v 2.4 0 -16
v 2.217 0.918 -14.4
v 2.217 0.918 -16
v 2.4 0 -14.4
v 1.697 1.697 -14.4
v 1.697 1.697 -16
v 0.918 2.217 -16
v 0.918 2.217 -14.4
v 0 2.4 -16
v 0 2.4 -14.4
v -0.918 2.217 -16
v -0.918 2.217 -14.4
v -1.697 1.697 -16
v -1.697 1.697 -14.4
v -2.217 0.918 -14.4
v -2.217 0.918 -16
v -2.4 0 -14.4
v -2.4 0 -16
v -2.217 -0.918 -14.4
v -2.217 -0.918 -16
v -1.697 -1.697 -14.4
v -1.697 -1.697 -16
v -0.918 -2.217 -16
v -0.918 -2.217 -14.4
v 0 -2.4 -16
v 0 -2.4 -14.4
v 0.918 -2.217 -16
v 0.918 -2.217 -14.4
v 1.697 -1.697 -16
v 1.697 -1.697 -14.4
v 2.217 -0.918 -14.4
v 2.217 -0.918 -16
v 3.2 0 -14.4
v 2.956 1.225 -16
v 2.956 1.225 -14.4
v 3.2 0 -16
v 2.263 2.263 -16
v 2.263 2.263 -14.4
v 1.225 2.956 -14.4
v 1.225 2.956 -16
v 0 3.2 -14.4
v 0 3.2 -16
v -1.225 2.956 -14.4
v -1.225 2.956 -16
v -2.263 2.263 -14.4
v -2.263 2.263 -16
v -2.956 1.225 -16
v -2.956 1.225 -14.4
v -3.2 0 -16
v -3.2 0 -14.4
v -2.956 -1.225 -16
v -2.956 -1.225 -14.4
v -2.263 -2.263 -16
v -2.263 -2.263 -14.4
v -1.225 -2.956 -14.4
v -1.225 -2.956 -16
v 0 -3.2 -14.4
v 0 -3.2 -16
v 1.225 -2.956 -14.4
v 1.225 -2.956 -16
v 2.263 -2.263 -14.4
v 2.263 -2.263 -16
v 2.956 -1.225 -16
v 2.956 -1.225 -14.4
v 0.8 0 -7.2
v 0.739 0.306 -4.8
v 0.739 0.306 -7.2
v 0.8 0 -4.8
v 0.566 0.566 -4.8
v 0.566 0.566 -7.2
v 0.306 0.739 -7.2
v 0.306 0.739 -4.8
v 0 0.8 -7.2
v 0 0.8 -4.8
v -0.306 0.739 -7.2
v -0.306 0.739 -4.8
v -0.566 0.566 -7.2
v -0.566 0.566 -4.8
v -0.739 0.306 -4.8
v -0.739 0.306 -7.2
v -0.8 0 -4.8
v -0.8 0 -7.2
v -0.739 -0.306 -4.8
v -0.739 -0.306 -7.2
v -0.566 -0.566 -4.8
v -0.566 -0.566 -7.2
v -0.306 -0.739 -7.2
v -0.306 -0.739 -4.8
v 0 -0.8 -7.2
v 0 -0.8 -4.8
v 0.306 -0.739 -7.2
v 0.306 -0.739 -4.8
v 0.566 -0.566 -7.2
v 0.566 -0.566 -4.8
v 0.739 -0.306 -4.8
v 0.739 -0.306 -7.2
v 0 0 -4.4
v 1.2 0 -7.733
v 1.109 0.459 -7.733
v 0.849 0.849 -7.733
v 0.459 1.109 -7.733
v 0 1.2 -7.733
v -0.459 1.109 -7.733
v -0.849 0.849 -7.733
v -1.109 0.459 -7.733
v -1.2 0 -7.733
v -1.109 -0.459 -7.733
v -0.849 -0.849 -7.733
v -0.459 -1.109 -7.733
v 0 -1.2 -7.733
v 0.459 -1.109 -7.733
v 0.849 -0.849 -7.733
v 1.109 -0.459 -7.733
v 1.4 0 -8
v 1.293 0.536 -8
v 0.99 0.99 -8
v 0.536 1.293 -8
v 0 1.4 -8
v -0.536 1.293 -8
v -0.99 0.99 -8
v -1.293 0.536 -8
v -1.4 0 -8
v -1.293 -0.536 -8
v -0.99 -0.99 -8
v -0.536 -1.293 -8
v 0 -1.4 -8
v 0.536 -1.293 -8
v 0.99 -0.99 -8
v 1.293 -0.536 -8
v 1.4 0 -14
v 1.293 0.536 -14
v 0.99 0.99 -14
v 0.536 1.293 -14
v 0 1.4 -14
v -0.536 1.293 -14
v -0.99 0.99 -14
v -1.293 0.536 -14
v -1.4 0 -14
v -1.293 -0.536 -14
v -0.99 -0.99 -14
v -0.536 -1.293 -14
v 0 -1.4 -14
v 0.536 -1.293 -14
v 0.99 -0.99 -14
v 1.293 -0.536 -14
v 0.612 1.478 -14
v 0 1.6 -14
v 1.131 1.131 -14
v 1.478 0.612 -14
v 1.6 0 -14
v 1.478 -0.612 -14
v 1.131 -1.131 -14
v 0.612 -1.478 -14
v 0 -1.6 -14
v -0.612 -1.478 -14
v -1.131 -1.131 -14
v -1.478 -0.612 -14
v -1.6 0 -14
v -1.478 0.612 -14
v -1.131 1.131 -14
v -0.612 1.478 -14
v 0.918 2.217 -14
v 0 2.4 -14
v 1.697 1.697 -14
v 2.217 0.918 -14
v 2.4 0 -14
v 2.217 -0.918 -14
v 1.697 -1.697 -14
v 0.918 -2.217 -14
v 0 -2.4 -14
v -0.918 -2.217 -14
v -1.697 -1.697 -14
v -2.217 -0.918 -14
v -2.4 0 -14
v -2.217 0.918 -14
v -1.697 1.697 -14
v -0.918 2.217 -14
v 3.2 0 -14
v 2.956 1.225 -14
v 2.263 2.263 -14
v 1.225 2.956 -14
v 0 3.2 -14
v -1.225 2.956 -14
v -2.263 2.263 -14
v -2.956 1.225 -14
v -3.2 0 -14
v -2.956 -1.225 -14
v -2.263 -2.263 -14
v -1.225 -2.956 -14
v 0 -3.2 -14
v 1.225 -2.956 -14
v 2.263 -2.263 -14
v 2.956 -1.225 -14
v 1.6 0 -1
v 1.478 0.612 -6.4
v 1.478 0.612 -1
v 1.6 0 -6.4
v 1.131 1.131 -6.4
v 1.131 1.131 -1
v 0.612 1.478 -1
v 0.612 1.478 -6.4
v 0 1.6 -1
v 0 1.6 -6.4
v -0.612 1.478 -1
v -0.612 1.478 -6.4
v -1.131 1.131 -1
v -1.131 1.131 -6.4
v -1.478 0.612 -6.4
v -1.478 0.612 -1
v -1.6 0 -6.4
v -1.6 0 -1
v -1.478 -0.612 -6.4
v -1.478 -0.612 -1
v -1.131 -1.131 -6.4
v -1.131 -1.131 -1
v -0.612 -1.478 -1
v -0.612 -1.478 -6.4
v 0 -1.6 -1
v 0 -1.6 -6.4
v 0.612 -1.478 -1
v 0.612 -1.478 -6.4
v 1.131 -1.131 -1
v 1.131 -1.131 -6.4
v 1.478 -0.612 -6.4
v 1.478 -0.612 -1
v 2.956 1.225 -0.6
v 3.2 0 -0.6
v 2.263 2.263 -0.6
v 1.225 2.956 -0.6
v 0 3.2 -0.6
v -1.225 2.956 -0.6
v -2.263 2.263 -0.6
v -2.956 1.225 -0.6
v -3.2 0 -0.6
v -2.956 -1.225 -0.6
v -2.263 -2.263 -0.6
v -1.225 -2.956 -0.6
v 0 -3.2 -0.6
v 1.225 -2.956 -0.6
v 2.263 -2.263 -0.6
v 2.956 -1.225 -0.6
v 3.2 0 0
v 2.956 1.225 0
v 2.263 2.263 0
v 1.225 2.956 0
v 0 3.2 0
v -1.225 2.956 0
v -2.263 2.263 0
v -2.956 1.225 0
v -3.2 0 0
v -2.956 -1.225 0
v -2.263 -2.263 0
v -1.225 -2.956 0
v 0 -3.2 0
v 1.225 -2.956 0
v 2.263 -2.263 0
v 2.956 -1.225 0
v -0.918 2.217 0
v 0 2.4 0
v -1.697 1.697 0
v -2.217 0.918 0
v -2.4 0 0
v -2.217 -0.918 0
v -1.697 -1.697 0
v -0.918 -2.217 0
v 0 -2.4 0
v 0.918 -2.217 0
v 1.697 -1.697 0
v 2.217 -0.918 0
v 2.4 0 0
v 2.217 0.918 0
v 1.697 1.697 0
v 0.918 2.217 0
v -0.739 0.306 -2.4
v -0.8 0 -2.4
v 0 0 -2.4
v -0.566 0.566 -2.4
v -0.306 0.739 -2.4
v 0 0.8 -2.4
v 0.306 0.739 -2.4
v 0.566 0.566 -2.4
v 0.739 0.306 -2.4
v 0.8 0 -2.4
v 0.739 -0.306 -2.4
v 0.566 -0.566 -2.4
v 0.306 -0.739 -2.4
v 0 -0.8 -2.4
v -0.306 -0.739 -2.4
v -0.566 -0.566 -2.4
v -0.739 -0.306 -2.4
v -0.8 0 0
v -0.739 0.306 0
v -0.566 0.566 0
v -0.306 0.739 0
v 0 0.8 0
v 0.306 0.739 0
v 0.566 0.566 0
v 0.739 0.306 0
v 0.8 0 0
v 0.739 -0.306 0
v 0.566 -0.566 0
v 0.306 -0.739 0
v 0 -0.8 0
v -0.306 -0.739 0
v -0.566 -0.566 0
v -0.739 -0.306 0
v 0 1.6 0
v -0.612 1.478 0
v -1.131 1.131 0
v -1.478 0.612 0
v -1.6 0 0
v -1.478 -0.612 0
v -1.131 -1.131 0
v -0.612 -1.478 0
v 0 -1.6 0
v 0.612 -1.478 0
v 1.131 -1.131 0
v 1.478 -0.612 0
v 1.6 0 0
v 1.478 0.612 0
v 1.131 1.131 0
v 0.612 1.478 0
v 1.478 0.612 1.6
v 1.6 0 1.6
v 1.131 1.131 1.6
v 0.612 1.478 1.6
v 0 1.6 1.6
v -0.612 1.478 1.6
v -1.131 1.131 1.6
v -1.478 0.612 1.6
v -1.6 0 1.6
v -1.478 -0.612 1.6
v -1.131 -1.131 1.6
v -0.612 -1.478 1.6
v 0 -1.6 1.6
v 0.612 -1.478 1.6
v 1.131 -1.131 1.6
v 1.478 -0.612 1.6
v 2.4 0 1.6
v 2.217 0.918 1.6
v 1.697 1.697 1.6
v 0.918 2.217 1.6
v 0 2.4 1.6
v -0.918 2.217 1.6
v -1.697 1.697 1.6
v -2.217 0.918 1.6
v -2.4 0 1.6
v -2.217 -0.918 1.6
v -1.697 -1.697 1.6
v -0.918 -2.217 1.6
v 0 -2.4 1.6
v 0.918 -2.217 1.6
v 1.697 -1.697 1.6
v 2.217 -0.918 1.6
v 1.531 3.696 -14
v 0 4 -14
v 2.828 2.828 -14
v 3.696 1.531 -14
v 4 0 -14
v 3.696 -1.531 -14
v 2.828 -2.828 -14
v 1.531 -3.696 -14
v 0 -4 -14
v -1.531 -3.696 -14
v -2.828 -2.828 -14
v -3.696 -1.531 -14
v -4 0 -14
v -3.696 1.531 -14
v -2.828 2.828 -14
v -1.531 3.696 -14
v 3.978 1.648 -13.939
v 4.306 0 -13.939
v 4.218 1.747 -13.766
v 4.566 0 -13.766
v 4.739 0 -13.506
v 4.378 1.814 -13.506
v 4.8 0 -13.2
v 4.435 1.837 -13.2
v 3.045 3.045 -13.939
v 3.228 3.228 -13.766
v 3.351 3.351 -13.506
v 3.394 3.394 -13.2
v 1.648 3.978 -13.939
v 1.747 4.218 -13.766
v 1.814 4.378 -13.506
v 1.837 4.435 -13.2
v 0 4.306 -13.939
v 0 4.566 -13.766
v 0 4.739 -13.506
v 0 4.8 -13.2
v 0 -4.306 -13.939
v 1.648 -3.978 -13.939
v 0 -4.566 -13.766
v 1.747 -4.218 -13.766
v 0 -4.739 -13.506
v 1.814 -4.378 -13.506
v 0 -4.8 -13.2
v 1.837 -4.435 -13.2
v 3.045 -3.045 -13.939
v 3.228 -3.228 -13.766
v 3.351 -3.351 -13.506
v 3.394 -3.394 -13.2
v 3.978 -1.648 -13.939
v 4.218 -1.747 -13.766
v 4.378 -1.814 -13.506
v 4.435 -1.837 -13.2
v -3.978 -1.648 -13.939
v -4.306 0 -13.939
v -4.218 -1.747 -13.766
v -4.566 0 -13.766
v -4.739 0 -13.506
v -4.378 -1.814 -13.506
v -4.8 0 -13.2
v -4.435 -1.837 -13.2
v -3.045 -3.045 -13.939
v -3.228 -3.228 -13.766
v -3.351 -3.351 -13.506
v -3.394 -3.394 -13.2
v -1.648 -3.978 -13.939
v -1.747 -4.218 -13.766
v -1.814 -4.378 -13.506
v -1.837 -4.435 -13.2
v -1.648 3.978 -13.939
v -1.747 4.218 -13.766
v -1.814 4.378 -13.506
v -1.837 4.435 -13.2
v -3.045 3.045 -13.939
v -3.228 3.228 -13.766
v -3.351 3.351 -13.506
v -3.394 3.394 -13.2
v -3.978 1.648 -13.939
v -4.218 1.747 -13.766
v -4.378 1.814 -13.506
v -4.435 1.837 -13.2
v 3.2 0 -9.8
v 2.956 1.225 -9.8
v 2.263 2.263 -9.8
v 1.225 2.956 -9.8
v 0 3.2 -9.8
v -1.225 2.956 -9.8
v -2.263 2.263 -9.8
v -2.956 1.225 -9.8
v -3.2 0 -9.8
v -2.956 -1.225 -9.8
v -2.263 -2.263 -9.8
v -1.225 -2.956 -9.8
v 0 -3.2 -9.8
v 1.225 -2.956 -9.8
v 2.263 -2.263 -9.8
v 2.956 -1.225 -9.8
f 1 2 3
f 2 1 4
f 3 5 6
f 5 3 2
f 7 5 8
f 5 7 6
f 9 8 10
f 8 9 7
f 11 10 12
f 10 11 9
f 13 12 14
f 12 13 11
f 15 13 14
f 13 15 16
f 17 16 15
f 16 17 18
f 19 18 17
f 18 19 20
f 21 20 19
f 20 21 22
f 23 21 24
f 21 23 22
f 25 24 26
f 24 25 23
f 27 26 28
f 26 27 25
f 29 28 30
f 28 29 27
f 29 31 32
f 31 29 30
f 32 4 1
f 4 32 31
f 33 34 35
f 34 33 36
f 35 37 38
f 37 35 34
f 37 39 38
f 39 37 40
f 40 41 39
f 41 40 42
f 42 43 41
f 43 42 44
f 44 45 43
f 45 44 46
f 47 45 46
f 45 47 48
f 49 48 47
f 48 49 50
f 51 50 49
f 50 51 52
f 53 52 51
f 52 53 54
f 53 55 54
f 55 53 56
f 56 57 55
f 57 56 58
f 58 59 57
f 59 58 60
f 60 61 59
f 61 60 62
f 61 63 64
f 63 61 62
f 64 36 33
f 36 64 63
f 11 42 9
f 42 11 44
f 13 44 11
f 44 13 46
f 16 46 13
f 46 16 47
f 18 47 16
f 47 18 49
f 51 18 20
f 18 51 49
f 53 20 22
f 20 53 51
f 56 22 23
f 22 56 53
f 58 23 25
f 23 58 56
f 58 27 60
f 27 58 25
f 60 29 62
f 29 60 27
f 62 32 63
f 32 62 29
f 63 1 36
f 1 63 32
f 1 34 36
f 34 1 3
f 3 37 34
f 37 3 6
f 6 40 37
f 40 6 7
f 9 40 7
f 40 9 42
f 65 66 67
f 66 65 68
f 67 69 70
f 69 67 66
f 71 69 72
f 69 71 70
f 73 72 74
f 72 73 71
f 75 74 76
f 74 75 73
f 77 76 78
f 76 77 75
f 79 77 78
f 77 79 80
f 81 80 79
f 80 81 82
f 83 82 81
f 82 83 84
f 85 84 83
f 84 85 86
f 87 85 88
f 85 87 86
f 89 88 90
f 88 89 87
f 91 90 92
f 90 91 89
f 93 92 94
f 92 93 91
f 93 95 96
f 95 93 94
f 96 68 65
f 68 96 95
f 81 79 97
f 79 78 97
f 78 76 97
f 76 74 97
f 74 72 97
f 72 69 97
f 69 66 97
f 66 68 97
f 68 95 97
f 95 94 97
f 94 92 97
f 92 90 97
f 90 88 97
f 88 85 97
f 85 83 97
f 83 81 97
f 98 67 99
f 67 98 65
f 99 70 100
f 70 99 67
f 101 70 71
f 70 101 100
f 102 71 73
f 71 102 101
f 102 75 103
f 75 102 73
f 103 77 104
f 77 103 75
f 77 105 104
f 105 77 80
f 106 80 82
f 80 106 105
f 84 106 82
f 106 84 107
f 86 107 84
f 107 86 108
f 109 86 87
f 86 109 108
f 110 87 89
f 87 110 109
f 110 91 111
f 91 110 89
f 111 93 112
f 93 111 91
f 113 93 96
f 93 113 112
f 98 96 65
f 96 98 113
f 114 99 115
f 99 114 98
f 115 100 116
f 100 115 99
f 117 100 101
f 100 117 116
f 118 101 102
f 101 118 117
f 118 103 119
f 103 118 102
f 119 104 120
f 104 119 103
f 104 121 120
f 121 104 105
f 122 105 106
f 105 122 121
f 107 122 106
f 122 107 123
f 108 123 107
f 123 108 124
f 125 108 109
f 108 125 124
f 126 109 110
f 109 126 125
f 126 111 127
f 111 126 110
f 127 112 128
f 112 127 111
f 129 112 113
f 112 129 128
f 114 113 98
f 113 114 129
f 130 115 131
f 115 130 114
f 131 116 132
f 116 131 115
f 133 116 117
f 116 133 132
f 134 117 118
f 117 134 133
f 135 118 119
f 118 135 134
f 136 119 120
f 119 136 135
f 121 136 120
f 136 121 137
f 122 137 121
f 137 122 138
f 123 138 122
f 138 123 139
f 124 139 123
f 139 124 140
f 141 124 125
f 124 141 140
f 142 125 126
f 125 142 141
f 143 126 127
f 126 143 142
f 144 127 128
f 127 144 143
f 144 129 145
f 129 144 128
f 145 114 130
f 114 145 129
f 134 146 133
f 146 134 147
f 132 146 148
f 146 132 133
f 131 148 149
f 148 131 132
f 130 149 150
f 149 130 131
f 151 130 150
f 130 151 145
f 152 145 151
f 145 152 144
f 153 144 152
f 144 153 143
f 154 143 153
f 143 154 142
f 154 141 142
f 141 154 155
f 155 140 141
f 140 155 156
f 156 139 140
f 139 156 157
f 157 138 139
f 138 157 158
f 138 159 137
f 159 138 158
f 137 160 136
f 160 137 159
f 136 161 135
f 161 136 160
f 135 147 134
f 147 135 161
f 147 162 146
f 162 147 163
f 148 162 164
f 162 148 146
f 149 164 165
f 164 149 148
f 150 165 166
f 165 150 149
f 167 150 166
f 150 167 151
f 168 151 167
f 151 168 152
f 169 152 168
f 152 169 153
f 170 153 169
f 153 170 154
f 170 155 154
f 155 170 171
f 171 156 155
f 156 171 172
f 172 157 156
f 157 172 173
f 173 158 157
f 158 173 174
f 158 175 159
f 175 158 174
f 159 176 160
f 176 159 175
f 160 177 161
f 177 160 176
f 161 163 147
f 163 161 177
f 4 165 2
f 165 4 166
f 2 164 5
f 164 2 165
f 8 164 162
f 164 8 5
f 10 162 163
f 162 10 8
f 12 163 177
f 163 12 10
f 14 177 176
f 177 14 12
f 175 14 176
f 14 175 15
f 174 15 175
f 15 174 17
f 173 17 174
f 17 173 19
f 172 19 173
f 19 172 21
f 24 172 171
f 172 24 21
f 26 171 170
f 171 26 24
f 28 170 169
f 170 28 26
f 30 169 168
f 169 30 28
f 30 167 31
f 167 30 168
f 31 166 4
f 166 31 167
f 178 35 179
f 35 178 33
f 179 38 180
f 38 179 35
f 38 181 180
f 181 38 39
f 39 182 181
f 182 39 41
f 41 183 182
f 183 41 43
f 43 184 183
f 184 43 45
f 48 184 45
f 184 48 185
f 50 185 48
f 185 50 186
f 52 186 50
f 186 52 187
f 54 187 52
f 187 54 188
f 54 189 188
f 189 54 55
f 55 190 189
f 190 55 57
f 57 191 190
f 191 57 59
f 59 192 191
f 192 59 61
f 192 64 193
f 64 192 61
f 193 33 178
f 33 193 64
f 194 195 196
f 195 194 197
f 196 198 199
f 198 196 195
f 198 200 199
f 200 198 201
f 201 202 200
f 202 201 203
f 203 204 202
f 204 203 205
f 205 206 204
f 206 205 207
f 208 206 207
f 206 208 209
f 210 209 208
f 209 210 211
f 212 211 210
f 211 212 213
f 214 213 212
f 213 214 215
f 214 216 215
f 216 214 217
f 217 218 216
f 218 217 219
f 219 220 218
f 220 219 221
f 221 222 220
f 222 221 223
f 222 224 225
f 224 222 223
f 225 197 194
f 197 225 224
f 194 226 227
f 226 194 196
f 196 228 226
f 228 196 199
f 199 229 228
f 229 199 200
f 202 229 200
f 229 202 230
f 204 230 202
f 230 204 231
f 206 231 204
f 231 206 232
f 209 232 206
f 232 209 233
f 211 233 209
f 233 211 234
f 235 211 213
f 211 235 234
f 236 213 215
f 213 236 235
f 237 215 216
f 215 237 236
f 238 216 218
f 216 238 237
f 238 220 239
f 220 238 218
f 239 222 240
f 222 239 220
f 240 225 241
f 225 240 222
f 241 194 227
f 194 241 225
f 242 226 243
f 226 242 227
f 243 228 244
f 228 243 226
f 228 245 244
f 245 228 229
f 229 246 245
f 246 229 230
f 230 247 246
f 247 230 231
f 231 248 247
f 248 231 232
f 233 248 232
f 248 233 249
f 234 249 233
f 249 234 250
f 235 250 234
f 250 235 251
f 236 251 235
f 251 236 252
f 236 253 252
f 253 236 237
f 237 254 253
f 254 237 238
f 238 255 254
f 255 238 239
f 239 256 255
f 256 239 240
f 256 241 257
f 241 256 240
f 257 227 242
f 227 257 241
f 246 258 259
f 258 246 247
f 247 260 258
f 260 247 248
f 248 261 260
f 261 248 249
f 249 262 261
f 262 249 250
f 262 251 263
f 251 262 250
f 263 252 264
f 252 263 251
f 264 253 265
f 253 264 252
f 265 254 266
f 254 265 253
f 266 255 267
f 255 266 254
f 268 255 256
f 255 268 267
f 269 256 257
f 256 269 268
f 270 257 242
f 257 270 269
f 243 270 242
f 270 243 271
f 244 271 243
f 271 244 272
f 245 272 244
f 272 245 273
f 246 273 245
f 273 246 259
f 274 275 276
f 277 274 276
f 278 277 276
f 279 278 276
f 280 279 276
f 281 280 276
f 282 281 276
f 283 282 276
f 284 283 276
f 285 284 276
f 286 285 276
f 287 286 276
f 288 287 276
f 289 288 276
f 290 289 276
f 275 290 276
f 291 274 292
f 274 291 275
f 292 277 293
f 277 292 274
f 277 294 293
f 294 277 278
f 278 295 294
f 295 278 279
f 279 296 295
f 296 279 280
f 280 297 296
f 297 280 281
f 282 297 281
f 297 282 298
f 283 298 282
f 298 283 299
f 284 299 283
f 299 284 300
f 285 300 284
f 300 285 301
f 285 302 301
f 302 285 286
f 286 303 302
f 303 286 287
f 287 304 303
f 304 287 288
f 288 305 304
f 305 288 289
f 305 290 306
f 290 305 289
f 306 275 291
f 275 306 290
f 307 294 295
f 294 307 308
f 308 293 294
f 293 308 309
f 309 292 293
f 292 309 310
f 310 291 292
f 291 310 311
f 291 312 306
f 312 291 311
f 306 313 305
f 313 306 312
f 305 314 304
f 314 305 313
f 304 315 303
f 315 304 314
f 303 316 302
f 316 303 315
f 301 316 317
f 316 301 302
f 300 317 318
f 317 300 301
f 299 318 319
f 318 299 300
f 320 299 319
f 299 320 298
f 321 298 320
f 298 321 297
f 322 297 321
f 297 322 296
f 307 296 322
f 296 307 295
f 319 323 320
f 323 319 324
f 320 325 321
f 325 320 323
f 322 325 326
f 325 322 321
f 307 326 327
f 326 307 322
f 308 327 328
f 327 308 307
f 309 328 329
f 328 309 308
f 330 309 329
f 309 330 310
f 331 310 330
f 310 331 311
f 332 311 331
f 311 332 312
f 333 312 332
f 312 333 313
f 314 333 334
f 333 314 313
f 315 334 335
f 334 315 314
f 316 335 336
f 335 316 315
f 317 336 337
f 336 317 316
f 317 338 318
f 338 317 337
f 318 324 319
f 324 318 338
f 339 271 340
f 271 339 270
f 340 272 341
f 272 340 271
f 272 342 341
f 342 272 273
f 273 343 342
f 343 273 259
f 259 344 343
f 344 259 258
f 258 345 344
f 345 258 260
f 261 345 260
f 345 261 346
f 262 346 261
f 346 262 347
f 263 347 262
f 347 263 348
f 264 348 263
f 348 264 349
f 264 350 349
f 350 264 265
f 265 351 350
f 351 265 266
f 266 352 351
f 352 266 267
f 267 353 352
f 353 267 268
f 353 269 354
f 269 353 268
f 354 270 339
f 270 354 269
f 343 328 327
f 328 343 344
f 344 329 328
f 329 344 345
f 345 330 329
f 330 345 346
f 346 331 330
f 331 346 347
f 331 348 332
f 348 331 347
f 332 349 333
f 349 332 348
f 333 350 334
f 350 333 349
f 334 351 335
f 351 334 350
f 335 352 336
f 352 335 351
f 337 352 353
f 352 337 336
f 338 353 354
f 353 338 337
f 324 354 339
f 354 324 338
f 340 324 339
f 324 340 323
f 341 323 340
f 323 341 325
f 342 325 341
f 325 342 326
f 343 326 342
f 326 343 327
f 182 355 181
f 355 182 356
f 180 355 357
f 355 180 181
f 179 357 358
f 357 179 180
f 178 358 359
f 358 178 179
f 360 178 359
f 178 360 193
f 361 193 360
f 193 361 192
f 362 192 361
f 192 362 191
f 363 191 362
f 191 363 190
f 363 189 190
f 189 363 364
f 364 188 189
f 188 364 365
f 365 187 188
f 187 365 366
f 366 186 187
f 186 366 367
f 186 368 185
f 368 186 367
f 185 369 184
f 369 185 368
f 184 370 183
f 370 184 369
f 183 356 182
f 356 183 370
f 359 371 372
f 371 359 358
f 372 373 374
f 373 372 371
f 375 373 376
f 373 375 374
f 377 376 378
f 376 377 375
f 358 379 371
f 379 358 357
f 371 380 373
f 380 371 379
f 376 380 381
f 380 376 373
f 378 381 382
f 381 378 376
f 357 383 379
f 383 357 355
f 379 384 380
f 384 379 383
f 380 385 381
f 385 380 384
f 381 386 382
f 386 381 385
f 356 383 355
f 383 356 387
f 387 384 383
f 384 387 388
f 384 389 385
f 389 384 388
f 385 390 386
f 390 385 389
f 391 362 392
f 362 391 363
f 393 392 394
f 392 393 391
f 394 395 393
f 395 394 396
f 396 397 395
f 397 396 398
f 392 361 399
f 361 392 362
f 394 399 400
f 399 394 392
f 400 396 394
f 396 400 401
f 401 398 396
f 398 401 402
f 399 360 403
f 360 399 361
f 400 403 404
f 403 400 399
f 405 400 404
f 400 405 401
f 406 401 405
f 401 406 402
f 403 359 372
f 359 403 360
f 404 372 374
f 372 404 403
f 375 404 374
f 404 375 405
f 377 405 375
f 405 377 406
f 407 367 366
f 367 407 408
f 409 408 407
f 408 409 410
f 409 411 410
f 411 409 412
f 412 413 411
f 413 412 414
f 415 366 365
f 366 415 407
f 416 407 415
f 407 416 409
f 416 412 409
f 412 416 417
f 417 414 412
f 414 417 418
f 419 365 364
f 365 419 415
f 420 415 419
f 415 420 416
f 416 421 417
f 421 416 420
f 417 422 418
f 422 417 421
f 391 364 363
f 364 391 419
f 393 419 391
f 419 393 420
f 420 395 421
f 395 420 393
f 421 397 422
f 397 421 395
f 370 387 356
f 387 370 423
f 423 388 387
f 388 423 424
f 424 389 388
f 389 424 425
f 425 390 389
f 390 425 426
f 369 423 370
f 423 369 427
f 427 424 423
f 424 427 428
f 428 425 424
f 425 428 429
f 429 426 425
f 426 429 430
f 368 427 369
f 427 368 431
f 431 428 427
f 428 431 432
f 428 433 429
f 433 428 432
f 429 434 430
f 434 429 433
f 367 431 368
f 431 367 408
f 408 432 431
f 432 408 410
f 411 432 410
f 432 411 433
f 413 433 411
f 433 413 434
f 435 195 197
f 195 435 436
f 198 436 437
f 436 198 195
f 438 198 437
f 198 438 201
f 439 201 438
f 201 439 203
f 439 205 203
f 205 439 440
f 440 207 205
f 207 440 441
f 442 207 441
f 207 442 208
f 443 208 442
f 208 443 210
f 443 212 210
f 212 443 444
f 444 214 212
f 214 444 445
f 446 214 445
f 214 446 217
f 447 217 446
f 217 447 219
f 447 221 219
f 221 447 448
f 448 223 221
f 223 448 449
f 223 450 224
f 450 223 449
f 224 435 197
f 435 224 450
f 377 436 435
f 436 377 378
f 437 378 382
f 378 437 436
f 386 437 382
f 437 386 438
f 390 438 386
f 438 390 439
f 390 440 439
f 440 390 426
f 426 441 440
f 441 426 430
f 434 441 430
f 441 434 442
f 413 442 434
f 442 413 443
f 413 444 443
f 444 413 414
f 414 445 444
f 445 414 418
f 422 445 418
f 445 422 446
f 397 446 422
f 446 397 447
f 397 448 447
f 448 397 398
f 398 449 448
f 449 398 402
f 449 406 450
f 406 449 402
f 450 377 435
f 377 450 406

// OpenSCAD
use <../lib.scad>
use <s/u9180s01.scad>
use <s/u9180s02.scad>
function ldraw_lib__u9180() = [
// 0 Minifig Conical Flask
// 0 Name: u9180.dat
// 0 Author: Magnus Forsberg [MagFors]
// 0 !LDRAW_ORG Part UPDATE 2012-02
// 0 !LICENSE Licensed under CC BY 4.0 : see CAreadme.txt
// 
// 0 BFC CERTIFY CCW
  [0,"BFC","CERTIFY"],
  [0,"BFC","CCW"],
// 
// 0 !CATEGORY Minifig Accessory
// 
// 0 !HISTORY 2012-08-09 [PTadmin] Official Update 2012-02
// 
// 
// 1 16 0 0 0 1 0 0 0 1 0 0 0 1 s\u9180s01.dat
  [1,16,0,0,0,1,0,0,0,1,0,0,0,1, ldraw_lib__s__u9180s01()],
// 1 16 0 0 0 1 0 0 0 1 0 0 0 1 s\u9180s02.dat
  [1,16,0,0,0,1,0,0,0,1,0,0,0,1, ldraw_lib__s__u9180s02()],
];
module ldraw_lib__u9180(step=0, col=false, unit=2/5, alt=false, line=0.2, solid=!$preview)
    makepoly(ldraw_lib__u9180(), step=step, col=col, unit=unit, alt=alt, line=line, solid=solid);
ldraw_lib__u9180(line=0.2);
